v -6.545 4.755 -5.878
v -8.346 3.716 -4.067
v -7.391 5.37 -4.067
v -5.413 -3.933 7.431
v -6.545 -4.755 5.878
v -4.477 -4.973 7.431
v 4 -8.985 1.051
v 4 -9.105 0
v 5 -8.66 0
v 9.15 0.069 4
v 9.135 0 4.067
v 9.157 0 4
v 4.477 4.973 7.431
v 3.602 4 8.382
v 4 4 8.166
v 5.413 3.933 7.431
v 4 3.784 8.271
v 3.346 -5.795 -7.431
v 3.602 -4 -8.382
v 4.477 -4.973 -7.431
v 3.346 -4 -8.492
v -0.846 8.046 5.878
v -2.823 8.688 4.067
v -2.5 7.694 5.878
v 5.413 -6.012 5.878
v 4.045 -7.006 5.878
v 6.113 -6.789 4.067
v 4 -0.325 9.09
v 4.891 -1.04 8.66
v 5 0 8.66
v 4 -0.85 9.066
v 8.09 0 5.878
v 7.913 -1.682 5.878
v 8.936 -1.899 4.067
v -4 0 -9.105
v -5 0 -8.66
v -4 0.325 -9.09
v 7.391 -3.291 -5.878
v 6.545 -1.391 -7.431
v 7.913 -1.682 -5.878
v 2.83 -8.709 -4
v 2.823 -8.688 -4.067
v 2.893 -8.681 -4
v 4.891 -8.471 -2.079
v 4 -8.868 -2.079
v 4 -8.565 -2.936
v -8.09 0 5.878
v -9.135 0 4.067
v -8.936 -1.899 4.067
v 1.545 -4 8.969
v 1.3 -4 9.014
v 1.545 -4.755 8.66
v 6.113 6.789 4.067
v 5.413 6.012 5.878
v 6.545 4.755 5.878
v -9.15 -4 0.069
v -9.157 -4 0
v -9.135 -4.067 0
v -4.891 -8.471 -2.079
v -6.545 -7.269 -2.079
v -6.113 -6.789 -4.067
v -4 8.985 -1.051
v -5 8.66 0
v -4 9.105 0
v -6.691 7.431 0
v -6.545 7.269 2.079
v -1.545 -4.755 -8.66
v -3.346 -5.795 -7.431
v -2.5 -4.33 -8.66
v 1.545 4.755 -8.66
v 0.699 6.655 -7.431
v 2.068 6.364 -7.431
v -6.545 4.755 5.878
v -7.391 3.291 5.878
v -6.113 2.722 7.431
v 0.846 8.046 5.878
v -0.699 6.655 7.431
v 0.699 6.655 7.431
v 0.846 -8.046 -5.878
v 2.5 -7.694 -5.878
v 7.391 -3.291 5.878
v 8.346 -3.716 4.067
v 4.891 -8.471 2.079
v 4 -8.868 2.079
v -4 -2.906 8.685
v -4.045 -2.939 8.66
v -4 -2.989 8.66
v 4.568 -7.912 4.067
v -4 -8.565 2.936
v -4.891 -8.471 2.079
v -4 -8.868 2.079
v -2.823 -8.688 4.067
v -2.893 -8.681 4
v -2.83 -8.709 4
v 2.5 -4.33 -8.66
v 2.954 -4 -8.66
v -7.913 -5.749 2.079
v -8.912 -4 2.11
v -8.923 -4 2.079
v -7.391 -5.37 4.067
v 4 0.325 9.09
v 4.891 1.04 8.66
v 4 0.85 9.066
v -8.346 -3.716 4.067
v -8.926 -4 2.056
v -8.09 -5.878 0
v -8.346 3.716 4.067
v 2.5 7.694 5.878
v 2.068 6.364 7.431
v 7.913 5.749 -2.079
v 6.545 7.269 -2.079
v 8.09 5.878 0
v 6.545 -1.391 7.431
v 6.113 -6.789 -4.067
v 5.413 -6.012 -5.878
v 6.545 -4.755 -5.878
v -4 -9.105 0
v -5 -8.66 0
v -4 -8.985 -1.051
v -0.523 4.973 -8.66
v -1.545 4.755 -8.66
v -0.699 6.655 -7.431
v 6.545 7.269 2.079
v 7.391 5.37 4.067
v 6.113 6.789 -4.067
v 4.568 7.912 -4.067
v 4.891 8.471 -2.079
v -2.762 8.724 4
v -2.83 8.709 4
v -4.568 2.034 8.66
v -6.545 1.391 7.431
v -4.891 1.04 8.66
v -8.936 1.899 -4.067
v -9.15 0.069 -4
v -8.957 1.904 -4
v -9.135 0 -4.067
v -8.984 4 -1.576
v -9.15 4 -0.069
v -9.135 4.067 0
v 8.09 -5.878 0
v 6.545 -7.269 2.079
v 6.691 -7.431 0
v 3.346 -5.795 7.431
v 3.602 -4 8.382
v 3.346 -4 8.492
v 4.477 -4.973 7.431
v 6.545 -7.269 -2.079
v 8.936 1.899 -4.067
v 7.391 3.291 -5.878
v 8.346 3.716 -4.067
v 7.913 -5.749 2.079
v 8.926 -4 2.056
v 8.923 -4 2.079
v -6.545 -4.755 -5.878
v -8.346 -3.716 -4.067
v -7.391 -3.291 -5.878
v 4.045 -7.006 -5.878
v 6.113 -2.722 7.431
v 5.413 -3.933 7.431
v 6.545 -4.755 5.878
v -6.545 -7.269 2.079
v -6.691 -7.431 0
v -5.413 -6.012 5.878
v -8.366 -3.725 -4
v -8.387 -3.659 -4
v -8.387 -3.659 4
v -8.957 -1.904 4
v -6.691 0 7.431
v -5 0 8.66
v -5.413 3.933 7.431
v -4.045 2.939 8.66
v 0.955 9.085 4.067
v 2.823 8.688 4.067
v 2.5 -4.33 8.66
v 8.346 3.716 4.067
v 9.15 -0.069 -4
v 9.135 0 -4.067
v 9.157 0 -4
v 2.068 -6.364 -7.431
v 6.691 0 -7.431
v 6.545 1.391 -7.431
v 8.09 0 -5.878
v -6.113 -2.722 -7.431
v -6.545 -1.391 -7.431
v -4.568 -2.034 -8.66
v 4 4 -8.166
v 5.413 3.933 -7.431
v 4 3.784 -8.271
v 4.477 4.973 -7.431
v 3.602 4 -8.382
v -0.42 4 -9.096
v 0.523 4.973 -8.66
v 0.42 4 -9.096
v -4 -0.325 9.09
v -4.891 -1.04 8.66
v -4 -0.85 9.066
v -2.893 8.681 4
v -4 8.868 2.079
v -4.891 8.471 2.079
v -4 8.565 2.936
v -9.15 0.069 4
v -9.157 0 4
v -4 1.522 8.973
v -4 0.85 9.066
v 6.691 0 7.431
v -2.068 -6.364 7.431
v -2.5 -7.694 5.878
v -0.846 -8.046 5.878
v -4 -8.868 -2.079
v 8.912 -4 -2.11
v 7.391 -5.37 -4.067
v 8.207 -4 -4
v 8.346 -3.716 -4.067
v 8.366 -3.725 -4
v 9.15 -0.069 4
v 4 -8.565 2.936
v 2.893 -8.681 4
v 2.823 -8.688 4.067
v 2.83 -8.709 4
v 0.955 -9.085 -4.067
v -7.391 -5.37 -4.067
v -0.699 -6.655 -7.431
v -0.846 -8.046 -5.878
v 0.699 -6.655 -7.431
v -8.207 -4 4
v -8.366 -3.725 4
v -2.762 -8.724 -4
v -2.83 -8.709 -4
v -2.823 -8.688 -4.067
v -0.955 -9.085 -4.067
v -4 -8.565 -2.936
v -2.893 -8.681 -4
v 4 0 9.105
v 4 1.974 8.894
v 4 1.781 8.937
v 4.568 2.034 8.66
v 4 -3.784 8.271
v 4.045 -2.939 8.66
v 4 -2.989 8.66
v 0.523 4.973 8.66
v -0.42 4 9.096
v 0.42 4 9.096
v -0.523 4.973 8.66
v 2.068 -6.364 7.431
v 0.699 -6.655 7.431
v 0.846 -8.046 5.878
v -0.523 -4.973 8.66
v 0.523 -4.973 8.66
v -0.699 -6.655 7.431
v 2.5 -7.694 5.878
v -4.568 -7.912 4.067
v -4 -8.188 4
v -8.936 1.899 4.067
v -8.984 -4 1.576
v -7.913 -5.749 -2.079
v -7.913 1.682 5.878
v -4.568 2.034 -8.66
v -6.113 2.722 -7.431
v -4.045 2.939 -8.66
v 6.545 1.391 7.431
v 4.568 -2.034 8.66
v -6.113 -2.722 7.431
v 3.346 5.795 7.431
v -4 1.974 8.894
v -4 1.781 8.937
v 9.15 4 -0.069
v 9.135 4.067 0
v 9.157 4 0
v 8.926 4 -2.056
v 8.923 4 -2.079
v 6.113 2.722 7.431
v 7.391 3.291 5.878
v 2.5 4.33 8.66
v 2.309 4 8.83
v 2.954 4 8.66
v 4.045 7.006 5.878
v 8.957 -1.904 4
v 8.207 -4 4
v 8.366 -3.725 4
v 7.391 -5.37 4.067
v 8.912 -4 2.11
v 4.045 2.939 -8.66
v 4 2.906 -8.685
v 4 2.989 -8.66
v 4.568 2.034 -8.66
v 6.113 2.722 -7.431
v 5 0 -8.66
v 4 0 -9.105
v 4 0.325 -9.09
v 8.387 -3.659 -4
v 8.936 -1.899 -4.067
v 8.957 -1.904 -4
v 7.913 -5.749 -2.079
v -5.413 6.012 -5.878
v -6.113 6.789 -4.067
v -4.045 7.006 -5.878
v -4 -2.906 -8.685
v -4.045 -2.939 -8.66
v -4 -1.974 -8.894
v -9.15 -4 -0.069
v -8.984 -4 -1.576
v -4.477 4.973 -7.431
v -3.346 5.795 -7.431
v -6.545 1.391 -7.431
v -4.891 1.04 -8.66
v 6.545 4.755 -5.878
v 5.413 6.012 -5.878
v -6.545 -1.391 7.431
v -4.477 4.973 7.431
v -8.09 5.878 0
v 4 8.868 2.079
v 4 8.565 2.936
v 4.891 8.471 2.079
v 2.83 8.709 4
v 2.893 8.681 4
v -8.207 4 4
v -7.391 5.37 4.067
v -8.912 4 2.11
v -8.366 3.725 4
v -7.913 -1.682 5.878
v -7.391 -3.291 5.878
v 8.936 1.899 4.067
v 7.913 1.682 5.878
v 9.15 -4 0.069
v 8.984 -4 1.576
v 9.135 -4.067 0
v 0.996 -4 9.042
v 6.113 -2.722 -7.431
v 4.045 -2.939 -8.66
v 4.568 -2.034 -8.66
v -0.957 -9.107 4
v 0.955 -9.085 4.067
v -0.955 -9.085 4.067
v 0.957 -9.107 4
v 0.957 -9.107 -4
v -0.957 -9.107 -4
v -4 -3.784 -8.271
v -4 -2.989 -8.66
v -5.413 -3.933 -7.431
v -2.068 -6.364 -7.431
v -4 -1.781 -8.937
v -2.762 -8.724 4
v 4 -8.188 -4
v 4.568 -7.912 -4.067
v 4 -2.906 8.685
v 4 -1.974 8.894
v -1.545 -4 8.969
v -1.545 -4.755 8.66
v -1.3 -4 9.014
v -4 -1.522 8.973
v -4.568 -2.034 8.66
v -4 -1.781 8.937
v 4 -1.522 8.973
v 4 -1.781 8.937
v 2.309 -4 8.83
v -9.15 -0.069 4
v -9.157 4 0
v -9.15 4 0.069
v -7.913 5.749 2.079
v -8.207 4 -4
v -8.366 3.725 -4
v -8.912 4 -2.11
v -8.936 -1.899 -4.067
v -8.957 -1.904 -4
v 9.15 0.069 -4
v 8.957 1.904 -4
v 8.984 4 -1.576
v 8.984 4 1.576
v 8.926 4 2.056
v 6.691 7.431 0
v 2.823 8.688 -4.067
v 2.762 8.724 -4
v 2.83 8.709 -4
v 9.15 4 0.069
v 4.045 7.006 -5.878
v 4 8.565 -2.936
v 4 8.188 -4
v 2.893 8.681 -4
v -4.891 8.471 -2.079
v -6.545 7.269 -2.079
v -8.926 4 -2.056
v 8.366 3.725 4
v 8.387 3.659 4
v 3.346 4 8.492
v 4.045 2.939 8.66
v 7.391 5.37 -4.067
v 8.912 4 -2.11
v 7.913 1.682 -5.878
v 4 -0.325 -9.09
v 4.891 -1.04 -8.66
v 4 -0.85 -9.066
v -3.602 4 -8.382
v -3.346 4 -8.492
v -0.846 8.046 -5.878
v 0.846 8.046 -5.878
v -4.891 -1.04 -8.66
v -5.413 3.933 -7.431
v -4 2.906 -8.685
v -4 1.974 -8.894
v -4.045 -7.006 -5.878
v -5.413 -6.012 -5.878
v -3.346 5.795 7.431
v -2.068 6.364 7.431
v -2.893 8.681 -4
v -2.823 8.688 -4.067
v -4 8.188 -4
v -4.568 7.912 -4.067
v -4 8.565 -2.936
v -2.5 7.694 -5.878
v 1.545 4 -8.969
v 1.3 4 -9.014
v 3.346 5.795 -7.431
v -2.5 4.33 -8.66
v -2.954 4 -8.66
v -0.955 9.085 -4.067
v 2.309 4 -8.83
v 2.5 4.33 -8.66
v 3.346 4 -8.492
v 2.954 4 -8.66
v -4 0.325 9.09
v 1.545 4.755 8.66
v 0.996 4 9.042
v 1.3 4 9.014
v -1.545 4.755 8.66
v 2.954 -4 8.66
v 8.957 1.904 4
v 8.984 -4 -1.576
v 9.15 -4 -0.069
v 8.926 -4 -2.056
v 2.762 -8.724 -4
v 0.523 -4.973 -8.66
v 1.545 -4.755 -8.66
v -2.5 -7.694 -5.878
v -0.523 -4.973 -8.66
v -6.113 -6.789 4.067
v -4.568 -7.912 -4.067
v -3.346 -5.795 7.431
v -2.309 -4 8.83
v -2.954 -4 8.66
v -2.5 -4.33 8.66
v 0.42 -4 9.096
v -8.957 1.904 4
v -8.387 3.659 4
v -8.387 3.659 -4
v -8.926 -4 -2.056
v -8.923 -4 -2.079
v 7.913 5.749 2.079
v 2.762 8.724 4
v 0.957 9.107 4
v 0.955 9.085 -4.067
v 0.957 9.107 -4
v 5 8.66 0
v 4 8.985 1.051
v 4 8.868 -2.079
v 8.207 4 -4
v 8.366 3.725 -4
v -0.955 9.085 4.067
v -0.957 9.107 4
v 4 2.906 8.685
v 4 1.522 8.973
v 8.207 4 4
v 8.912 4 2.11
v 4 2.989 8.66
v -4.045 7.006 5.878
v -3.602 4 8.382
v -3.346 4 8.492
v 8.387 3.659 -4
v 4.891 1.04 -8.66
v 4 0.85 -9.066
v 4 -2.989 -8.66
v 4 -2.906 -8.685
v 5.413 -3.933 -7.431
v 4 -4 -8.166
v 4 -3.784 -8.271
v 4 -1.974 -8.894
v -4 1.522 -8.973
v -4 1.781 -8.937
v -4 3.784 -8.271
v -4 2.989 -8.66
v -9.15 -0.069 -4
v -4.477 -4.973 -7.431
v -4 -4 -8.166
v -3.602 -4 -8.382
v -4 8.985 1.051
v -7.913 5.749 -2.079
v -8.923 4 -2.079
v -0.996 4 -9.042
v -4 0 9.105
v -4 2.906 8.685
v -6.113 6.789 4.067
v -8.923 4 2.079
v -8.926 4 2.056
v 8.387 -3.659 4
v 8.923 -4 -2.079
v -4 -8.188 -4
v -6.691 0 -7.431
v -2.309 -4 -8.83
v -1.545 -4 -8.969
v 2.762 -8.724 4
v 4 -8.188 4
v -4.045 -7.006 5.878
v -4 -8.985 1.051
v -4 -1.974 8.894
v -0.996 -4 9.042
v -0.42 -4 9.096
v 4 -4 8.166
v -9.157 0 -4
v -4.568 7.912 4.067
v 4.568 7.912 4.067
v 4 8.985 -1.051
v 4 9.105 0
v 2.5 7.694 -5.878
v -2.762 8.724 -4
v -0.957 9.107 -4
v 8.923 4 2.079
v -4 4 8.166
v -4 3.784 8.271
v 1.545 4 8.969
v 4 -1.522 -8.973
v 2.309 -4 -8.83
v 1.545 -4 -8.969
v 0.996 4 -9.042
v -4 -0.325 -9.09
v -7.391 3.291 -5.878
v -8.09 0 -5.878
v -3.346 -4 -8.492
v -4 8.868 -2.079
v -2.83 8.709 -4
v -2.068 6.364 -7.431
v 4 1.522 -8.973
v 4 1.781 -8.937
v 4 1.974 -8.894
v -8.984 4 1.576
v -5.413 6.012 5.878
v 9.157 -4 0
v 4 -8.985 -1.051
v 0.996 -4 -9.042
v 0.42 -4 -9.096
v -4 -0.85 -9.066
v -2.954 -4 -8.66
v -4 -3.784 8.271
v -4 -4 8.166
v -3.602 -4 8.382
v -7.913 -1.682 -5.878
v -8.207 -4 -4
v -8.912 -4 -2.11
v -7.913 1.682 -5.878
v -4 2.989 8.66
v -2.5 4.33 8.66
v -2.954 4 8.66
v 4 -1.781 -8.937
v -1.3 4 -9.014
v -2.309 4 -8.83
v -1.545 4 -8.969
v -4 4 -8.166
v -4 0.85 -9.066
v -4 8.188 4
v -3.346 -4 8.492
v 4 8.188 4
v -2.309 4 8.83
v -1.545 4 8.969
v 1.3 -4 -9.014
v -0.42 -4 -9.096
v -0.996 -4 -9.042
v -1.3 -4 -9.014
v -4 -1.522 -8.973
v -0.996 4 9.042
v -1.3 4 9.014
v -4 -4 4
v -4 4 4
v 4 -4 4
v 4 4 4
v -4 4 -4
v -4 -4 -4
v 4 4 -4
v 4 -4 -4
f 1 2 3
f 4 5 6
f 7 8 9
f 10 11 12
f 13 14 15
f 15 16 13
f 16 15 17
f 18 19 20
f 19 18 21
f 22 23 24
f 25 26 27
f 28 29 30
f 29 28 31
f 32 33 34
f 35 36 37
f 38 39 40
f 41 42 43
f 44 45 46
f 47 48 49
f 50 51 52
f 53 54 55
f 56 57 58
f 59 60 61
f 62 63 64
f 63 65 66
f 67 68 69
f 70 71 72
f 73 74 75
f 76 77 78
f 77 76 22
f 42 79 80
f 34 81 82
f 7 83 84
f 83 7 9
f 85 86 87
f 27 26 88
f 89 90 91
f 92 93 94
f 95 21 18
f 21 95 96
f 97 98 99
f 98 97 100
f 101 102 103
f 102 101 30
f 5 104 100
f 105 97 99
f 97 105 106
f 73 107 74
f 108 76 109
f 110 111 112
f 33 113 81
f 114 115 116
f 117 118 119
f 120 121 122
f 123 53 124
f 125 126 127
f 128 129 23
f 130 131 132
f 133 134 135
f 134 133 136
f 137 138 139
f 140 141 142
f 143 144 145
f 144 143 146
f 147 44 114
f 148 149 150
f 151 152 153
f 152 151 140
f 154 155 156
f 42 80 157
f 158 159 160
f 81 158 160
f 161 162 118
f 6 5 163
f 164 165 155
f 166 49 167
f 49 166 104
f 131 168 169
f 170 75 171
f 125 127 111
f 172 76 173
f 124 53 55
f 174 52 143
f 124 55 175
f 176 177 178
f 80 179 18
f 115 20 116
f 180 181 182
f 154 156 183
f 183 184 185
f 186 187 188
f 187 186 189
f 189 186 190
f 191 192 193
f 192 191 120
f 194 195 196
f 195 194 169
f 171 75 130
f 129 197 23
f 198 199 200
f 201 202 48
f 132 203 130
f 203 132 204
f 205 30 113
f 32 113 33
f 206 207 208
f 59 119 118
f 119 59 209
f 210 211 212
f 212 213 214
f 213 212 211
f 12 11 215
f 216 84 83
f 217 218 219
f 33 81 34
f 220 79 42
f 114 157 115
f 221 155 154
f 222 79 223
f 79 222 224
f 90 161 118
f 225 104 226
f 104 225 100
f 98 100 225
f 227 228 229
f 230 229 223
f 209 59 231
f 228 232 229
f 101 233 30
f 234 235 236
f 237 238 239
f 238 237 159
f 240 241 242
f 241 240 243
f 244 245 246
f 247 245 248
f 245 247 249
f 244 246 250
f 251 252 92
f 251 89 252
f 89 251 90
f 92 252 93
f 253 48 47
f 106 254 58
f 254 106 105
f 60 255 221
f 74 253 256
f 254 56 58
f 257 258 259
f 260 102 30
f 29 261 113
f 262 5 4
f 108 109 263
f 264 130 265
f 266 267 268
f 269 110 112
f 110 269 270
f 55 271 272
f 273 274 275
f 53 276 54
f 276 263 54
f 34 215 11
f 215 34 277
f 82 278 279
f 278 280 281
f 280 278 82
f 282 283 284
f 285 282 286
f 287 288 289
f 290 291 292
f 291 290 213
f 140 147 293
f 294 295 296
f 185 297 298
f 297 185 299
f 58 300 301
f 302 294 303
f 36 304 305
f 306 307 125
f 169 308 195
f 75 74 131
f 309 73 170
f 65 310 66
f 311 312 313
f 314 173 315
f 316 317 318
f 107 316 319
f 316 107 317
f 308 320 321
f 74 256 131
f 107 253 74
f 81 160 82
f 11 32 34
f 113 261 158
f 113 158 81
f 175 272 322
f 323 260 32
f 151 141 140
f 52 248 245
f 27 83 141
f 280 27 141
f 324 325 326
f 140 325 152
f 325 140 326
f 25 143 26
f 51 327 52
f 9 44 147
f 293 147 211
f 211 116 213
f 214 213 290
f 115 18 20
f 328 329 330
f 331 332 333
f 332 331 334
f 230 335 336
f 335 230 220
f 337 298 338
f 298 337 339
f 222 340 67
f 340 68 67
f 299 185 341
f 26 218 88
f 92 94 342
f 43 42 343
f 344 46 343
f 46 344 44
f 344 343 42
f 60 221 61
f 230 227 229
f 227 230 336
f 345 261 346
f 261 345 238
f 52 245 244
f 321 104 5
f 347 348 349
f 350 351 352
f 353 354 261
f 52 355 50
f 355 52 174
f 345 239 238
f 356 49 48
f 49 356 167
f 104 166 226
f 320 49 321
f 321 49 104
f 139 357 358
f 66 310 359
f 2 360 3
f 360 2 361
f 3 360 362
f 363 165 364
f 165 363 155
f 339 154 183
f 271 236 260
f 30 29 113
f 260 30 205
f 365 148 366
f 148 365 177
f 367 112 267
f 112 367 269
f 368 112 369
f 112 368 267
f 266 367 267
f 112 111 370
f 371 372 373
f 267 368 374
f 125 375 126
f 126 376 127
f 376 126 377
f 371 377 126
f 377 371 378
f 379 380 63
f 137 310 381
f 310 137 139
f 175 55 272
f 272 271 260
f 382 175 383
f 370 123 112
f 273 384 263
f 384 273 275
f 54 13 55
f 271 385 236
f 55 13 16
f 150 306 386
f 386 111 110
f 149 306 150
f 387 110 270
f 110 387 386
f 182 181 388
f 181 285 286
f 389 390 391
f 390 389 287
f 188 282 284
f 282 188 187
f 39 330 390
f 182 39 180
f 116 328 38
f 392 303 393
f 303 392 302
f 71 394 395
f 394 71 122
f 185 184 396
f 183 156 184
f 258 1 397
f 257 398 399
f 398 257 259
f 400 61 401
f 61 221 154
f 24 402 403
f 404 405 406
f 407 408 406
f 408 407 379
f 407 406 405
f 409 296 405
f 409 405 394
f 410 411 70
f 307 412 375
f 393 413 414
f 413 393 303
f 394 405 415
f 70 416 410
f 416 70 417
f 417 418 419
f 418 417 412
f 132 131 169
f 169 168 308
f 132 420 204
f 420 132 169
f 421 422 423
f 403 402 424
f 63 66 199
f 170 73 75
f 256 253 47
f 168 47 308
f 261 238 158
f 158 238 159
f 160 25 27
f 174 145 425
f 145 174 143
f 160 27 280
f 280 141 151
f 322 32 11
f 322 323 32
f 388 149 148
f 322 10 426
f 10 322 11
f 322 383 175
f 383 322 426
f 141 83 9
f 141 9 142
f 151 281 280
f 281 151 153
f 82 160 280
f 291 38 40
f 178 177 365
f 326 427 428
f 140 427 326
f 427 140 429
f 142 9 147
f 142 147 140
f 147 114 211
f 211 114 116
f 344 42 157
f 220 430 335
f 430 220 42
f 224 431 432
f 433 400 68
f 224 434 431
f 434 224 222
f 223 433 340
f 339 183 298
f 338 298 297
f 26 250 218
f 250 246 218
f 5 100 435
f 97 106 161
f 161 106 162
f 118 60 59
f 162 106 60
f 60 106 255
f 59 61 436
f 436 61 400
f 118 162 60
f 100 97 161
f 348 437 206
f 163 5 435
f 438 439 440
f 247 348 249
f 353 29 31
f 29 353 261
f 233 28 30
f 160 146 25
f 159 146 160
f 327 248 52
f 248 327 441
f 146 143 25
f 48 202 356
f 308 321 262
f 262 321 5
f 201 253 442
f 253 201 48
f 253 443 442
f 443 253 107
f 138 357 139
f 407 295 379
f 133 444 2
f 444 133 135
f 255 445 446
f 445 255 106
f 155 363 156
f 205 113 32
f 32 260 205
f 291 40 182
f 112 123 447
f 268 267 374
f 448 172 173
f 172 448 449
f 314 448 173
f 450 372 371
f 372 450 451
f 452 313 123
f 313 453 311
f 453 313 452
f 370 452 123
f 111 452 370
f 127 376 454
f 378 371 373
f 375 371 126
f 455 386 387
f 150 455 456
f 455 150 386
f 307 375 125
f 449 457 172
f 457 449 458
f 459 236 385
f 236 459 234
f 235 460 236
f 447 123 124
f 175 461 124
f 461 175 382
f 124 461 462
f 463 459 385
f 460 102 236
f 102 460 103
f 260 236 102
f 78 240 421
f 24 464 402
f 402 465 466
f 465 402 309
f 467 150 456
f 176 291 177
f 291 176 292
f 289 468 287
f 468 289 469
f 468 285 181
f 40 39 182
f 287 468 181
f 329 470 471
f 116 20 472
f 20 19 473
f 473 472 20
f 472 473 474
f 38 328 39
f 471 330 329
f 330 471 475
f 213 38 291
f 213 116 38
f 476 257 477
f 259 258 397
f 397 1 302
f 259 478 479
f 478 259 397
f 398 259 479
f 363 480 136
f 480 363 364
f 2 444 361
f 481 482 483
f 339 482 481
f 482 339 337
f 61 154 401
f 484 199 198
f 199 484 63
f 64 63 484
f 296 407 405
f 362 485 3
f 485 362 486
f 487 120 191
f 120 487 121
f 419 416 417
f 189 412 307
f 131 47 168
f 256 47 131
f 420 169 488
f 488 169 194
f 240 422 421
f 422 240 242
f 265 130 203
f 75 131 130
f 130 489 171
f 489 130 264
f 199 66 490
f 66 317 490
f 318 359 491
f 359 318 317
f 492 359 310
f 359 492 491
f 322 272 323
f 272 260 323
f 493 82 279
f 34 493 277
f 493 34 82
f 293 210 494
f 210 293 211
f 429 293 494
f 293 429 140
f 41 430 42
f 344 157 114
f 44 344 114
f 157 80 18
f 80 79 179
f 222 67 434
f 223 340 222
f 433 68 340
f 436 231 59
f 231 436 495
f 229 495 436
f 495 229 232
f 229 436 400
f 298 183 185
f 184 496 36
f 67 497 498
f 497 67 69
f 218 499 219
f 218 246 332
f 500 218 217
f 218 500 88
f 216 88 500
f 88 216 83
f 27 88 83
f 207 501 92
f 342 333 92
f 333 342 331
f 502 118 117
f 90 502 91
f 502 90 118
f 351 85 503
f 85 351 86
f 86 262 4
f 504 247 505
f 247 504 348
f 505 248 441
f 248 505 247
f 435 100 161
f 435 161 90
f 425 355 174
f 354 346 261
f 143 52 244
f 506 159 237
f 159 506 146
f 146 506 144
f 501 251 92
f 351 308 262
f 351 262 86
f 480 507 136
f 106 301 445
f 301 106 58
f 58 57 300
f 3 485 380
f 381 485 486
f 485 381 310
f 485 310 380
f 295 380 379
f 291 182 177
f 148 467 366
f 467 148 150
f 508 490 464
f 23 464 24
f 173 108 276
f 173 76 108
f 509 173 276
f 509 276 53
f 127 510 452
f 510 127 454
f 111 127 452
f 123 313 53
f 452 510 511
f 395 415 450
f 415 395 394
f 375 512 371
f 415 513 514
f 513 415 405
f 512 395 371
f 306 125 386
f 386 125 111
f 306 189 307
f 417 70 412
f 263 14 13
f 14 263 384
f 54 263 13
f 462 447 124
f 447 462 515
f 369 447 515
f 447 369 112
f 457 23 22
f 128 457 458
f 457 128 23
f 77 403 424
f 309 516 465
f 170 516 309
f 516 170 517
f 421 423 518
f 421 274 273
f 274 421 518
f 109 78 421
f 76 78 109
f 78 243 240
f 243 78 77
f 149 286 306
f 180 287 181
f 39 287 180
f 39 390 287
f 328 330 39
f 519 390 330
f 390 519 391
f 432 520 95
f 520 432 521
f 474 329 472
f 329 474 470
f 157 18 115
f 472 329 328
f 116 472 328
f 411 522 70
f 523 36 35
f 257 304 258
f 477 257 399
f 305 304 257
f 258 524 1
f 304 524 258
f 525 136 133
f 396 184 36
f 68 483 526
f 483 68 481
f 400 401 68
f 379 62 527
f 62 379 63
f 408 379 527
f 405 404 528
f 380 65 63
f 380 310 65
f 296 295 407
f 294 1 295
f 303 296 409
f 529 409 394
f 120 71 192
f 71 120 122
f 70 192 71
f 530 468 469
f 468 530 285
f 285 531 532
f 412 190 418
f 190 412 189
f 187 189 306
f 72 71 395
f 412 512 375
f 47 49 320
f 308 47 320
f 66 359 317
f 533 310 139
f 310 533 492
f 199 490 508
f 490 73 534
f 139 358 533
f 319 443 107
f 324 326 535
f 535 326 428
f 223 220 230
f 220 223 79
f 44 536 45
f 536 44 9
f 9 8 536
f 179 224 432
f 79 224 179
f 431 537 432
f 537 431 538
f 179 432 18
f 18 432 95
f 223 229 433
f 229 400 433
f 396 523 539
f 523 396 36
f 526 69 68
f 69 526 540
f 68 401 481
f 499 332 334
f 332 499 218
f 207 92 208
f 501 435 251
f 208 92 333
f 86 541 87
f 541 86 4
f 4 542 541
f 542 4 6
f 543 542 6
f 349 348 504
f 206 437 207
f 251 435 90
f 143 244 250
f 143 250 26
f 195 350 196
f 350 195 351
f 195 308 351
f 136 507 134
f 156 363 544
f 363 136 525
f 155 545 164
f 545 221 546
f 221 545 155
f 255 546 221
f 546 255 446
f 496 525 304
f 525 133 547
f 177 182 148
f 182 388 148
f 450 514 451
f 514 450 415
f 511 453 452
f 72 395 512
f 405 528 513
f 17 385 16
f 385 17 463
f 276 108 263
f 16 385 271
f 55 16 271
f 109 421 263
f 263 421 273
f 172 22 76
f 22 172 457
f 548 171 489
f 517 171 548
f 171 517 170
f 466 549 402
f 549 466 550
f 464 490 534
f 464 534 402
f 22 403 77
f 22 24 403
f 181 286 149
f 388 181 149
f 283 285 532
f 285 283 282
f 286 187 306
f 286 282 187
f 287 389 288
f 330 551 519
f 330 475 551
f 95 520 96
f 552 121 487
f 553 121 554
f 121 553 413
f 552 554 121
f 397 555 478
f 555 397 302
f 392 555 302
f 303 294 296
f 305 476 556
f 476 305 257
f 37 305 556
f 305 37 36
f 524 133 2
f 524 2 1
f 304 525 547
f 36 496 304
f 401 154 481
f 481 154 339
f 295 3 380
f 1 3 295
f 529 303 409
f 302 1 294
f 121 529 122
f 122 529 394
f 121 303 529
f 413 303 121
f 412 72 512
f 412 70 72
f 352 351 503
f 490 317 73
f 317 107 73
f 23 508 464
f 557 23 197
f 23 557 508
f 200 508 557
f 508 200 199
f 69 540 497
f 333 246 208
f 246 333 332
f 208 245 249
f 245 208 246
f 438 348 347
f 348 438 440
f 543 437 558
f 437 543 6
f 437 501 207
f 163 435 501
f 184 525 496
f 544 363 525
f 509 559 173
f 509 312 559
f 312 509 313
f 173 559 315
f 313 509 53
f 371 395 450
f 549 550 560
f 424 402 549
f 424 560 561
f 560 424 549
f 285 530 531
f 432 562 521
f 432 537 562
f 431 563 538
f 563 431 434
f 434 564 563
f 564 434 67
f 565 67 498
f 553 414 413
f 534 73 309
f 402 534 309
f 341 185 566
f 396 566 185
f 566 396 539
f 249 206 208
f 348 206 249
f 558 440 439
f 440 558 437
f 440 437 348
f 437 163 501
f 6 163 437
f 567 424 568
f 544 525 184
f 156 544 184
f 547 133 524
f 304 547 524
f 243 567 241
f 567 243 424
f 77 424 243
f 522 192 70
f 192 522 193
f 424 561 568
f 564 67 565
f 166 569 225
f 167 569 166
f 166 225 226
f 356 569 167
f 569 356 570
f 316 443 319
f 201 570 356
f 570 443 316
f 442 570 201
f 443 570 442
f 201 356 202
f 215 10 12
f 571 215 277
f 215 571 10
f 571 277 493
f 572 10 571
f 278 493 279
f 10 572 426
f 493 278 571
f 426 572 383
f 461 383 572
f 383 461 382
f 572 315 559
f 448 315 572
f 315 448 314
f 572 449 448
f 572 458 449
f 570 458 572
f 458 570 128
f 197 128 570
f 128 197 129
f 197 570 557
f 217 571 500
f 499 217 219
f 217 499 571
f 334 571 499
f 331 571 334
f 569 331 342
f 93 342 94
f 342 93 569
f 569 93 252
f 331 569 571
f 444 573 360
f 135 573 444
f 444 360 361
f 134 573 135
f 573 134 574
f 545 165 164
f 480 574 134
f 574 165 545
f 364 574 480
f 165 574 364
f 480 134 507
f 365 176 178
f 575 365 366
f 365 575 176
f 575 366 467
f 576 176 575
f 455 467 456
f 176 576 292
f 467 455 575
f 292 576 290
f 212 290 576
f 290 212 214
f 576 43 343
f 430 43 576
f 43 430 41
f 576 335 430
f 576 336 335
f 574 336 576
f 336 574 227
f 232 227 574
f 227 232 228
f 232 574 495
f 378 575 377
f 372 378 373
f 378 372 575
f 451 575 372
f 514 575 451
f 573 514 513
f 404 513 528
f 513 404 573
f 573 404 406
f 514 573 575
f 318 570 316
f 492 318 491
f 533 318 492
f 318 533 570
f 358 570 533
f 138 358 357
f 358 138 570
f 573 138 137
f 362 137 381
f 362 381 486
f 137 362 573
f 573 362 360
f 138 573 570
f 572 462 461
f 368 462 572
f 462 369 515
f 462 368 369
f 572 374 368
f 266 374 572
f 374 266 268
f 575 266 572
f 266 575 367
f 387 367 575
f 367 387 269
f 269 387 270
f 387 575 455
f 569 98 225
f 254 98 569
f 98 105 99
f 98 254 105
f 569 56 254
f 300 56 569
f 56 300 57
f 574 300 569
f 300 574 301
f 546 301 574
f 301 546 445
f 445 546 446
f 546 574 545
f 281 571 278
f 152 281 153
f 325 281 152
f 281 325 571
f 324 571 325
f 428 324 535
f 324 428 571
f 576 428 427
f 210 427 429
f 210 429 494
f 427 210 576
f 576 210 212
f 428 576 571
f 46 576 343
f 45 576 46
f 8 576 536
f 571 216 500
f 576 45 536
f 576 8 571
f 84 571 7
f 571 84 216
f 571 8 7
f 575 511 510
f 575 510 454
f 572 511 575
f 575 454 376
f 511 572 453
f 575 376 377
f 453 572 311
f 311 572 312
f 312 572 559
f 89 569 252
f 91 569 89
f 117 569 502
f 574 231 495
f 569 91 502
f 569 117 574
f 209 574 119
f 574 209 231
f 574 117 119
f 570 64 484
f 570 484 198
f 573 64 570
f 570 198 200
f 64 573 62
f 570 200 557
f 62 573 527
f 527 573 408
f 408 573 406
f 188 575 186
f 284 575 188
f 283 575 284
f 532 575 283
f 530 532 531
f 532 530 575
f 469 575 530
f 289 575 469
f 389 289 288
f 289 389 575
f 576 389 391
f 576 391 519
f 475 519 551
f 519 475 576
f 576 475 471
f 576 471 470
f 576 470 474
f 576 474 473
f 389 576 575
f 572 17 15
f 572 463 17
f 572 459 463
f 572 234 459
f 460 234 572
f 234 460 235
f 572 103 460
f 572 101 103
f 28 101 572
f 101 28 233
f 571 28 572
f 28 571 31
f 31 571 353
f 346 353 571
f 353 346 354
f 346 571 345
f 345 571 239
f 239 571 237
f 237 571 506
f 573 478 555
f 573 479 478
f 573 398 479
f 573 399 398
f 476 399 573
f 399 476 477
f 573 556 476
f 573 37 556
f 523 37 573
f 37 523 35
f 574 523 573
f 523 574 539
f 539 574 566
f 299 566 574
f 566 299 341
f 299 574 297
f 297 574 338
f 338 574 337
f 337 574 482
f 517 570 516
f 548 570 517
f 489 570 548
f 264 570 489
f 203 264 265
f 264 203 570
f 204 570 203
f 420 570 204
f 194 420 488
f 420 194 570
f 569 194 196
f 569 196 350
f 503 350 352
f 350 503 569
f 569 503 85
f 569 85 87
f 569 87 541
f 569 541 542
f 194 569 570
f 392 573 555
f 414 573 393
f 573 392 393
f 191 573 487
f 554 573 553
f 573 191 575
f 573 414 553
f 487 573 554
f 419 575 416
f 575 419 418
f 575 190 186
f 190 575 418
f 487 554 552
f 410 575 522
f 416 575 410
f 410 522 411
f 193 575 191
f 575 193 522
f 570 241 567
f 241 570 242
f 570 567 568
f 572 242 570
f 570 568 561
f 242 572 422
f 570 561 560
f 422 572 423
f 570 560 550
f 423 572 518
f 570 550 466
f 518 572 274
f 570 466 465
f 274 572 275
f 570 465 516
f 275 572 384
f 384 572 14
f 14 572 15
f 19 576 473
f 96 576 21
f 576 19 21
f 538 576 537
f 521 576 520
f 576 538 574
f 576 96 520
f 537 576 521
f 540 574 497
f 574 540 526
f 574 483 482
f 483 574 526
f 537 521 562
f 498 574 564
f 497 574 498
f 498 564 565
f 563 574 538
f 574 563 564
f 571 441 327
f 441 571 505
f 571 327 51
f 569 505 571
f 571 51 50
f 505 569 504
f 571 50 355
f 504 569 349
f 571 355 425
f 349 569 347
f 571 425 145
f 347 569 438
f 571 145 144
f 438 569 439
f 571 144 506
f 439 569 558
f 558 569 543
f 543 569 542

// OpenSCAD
// Constructive Solid Geometry operator: difference
// "Subtracts" all additional items from the first item.

render() difference()
{
	sphere(r=10);
	cube([30,8,8], center=true);
	cube([8,30,8], center=true);
	cube([8,8,30], center=true);
}
